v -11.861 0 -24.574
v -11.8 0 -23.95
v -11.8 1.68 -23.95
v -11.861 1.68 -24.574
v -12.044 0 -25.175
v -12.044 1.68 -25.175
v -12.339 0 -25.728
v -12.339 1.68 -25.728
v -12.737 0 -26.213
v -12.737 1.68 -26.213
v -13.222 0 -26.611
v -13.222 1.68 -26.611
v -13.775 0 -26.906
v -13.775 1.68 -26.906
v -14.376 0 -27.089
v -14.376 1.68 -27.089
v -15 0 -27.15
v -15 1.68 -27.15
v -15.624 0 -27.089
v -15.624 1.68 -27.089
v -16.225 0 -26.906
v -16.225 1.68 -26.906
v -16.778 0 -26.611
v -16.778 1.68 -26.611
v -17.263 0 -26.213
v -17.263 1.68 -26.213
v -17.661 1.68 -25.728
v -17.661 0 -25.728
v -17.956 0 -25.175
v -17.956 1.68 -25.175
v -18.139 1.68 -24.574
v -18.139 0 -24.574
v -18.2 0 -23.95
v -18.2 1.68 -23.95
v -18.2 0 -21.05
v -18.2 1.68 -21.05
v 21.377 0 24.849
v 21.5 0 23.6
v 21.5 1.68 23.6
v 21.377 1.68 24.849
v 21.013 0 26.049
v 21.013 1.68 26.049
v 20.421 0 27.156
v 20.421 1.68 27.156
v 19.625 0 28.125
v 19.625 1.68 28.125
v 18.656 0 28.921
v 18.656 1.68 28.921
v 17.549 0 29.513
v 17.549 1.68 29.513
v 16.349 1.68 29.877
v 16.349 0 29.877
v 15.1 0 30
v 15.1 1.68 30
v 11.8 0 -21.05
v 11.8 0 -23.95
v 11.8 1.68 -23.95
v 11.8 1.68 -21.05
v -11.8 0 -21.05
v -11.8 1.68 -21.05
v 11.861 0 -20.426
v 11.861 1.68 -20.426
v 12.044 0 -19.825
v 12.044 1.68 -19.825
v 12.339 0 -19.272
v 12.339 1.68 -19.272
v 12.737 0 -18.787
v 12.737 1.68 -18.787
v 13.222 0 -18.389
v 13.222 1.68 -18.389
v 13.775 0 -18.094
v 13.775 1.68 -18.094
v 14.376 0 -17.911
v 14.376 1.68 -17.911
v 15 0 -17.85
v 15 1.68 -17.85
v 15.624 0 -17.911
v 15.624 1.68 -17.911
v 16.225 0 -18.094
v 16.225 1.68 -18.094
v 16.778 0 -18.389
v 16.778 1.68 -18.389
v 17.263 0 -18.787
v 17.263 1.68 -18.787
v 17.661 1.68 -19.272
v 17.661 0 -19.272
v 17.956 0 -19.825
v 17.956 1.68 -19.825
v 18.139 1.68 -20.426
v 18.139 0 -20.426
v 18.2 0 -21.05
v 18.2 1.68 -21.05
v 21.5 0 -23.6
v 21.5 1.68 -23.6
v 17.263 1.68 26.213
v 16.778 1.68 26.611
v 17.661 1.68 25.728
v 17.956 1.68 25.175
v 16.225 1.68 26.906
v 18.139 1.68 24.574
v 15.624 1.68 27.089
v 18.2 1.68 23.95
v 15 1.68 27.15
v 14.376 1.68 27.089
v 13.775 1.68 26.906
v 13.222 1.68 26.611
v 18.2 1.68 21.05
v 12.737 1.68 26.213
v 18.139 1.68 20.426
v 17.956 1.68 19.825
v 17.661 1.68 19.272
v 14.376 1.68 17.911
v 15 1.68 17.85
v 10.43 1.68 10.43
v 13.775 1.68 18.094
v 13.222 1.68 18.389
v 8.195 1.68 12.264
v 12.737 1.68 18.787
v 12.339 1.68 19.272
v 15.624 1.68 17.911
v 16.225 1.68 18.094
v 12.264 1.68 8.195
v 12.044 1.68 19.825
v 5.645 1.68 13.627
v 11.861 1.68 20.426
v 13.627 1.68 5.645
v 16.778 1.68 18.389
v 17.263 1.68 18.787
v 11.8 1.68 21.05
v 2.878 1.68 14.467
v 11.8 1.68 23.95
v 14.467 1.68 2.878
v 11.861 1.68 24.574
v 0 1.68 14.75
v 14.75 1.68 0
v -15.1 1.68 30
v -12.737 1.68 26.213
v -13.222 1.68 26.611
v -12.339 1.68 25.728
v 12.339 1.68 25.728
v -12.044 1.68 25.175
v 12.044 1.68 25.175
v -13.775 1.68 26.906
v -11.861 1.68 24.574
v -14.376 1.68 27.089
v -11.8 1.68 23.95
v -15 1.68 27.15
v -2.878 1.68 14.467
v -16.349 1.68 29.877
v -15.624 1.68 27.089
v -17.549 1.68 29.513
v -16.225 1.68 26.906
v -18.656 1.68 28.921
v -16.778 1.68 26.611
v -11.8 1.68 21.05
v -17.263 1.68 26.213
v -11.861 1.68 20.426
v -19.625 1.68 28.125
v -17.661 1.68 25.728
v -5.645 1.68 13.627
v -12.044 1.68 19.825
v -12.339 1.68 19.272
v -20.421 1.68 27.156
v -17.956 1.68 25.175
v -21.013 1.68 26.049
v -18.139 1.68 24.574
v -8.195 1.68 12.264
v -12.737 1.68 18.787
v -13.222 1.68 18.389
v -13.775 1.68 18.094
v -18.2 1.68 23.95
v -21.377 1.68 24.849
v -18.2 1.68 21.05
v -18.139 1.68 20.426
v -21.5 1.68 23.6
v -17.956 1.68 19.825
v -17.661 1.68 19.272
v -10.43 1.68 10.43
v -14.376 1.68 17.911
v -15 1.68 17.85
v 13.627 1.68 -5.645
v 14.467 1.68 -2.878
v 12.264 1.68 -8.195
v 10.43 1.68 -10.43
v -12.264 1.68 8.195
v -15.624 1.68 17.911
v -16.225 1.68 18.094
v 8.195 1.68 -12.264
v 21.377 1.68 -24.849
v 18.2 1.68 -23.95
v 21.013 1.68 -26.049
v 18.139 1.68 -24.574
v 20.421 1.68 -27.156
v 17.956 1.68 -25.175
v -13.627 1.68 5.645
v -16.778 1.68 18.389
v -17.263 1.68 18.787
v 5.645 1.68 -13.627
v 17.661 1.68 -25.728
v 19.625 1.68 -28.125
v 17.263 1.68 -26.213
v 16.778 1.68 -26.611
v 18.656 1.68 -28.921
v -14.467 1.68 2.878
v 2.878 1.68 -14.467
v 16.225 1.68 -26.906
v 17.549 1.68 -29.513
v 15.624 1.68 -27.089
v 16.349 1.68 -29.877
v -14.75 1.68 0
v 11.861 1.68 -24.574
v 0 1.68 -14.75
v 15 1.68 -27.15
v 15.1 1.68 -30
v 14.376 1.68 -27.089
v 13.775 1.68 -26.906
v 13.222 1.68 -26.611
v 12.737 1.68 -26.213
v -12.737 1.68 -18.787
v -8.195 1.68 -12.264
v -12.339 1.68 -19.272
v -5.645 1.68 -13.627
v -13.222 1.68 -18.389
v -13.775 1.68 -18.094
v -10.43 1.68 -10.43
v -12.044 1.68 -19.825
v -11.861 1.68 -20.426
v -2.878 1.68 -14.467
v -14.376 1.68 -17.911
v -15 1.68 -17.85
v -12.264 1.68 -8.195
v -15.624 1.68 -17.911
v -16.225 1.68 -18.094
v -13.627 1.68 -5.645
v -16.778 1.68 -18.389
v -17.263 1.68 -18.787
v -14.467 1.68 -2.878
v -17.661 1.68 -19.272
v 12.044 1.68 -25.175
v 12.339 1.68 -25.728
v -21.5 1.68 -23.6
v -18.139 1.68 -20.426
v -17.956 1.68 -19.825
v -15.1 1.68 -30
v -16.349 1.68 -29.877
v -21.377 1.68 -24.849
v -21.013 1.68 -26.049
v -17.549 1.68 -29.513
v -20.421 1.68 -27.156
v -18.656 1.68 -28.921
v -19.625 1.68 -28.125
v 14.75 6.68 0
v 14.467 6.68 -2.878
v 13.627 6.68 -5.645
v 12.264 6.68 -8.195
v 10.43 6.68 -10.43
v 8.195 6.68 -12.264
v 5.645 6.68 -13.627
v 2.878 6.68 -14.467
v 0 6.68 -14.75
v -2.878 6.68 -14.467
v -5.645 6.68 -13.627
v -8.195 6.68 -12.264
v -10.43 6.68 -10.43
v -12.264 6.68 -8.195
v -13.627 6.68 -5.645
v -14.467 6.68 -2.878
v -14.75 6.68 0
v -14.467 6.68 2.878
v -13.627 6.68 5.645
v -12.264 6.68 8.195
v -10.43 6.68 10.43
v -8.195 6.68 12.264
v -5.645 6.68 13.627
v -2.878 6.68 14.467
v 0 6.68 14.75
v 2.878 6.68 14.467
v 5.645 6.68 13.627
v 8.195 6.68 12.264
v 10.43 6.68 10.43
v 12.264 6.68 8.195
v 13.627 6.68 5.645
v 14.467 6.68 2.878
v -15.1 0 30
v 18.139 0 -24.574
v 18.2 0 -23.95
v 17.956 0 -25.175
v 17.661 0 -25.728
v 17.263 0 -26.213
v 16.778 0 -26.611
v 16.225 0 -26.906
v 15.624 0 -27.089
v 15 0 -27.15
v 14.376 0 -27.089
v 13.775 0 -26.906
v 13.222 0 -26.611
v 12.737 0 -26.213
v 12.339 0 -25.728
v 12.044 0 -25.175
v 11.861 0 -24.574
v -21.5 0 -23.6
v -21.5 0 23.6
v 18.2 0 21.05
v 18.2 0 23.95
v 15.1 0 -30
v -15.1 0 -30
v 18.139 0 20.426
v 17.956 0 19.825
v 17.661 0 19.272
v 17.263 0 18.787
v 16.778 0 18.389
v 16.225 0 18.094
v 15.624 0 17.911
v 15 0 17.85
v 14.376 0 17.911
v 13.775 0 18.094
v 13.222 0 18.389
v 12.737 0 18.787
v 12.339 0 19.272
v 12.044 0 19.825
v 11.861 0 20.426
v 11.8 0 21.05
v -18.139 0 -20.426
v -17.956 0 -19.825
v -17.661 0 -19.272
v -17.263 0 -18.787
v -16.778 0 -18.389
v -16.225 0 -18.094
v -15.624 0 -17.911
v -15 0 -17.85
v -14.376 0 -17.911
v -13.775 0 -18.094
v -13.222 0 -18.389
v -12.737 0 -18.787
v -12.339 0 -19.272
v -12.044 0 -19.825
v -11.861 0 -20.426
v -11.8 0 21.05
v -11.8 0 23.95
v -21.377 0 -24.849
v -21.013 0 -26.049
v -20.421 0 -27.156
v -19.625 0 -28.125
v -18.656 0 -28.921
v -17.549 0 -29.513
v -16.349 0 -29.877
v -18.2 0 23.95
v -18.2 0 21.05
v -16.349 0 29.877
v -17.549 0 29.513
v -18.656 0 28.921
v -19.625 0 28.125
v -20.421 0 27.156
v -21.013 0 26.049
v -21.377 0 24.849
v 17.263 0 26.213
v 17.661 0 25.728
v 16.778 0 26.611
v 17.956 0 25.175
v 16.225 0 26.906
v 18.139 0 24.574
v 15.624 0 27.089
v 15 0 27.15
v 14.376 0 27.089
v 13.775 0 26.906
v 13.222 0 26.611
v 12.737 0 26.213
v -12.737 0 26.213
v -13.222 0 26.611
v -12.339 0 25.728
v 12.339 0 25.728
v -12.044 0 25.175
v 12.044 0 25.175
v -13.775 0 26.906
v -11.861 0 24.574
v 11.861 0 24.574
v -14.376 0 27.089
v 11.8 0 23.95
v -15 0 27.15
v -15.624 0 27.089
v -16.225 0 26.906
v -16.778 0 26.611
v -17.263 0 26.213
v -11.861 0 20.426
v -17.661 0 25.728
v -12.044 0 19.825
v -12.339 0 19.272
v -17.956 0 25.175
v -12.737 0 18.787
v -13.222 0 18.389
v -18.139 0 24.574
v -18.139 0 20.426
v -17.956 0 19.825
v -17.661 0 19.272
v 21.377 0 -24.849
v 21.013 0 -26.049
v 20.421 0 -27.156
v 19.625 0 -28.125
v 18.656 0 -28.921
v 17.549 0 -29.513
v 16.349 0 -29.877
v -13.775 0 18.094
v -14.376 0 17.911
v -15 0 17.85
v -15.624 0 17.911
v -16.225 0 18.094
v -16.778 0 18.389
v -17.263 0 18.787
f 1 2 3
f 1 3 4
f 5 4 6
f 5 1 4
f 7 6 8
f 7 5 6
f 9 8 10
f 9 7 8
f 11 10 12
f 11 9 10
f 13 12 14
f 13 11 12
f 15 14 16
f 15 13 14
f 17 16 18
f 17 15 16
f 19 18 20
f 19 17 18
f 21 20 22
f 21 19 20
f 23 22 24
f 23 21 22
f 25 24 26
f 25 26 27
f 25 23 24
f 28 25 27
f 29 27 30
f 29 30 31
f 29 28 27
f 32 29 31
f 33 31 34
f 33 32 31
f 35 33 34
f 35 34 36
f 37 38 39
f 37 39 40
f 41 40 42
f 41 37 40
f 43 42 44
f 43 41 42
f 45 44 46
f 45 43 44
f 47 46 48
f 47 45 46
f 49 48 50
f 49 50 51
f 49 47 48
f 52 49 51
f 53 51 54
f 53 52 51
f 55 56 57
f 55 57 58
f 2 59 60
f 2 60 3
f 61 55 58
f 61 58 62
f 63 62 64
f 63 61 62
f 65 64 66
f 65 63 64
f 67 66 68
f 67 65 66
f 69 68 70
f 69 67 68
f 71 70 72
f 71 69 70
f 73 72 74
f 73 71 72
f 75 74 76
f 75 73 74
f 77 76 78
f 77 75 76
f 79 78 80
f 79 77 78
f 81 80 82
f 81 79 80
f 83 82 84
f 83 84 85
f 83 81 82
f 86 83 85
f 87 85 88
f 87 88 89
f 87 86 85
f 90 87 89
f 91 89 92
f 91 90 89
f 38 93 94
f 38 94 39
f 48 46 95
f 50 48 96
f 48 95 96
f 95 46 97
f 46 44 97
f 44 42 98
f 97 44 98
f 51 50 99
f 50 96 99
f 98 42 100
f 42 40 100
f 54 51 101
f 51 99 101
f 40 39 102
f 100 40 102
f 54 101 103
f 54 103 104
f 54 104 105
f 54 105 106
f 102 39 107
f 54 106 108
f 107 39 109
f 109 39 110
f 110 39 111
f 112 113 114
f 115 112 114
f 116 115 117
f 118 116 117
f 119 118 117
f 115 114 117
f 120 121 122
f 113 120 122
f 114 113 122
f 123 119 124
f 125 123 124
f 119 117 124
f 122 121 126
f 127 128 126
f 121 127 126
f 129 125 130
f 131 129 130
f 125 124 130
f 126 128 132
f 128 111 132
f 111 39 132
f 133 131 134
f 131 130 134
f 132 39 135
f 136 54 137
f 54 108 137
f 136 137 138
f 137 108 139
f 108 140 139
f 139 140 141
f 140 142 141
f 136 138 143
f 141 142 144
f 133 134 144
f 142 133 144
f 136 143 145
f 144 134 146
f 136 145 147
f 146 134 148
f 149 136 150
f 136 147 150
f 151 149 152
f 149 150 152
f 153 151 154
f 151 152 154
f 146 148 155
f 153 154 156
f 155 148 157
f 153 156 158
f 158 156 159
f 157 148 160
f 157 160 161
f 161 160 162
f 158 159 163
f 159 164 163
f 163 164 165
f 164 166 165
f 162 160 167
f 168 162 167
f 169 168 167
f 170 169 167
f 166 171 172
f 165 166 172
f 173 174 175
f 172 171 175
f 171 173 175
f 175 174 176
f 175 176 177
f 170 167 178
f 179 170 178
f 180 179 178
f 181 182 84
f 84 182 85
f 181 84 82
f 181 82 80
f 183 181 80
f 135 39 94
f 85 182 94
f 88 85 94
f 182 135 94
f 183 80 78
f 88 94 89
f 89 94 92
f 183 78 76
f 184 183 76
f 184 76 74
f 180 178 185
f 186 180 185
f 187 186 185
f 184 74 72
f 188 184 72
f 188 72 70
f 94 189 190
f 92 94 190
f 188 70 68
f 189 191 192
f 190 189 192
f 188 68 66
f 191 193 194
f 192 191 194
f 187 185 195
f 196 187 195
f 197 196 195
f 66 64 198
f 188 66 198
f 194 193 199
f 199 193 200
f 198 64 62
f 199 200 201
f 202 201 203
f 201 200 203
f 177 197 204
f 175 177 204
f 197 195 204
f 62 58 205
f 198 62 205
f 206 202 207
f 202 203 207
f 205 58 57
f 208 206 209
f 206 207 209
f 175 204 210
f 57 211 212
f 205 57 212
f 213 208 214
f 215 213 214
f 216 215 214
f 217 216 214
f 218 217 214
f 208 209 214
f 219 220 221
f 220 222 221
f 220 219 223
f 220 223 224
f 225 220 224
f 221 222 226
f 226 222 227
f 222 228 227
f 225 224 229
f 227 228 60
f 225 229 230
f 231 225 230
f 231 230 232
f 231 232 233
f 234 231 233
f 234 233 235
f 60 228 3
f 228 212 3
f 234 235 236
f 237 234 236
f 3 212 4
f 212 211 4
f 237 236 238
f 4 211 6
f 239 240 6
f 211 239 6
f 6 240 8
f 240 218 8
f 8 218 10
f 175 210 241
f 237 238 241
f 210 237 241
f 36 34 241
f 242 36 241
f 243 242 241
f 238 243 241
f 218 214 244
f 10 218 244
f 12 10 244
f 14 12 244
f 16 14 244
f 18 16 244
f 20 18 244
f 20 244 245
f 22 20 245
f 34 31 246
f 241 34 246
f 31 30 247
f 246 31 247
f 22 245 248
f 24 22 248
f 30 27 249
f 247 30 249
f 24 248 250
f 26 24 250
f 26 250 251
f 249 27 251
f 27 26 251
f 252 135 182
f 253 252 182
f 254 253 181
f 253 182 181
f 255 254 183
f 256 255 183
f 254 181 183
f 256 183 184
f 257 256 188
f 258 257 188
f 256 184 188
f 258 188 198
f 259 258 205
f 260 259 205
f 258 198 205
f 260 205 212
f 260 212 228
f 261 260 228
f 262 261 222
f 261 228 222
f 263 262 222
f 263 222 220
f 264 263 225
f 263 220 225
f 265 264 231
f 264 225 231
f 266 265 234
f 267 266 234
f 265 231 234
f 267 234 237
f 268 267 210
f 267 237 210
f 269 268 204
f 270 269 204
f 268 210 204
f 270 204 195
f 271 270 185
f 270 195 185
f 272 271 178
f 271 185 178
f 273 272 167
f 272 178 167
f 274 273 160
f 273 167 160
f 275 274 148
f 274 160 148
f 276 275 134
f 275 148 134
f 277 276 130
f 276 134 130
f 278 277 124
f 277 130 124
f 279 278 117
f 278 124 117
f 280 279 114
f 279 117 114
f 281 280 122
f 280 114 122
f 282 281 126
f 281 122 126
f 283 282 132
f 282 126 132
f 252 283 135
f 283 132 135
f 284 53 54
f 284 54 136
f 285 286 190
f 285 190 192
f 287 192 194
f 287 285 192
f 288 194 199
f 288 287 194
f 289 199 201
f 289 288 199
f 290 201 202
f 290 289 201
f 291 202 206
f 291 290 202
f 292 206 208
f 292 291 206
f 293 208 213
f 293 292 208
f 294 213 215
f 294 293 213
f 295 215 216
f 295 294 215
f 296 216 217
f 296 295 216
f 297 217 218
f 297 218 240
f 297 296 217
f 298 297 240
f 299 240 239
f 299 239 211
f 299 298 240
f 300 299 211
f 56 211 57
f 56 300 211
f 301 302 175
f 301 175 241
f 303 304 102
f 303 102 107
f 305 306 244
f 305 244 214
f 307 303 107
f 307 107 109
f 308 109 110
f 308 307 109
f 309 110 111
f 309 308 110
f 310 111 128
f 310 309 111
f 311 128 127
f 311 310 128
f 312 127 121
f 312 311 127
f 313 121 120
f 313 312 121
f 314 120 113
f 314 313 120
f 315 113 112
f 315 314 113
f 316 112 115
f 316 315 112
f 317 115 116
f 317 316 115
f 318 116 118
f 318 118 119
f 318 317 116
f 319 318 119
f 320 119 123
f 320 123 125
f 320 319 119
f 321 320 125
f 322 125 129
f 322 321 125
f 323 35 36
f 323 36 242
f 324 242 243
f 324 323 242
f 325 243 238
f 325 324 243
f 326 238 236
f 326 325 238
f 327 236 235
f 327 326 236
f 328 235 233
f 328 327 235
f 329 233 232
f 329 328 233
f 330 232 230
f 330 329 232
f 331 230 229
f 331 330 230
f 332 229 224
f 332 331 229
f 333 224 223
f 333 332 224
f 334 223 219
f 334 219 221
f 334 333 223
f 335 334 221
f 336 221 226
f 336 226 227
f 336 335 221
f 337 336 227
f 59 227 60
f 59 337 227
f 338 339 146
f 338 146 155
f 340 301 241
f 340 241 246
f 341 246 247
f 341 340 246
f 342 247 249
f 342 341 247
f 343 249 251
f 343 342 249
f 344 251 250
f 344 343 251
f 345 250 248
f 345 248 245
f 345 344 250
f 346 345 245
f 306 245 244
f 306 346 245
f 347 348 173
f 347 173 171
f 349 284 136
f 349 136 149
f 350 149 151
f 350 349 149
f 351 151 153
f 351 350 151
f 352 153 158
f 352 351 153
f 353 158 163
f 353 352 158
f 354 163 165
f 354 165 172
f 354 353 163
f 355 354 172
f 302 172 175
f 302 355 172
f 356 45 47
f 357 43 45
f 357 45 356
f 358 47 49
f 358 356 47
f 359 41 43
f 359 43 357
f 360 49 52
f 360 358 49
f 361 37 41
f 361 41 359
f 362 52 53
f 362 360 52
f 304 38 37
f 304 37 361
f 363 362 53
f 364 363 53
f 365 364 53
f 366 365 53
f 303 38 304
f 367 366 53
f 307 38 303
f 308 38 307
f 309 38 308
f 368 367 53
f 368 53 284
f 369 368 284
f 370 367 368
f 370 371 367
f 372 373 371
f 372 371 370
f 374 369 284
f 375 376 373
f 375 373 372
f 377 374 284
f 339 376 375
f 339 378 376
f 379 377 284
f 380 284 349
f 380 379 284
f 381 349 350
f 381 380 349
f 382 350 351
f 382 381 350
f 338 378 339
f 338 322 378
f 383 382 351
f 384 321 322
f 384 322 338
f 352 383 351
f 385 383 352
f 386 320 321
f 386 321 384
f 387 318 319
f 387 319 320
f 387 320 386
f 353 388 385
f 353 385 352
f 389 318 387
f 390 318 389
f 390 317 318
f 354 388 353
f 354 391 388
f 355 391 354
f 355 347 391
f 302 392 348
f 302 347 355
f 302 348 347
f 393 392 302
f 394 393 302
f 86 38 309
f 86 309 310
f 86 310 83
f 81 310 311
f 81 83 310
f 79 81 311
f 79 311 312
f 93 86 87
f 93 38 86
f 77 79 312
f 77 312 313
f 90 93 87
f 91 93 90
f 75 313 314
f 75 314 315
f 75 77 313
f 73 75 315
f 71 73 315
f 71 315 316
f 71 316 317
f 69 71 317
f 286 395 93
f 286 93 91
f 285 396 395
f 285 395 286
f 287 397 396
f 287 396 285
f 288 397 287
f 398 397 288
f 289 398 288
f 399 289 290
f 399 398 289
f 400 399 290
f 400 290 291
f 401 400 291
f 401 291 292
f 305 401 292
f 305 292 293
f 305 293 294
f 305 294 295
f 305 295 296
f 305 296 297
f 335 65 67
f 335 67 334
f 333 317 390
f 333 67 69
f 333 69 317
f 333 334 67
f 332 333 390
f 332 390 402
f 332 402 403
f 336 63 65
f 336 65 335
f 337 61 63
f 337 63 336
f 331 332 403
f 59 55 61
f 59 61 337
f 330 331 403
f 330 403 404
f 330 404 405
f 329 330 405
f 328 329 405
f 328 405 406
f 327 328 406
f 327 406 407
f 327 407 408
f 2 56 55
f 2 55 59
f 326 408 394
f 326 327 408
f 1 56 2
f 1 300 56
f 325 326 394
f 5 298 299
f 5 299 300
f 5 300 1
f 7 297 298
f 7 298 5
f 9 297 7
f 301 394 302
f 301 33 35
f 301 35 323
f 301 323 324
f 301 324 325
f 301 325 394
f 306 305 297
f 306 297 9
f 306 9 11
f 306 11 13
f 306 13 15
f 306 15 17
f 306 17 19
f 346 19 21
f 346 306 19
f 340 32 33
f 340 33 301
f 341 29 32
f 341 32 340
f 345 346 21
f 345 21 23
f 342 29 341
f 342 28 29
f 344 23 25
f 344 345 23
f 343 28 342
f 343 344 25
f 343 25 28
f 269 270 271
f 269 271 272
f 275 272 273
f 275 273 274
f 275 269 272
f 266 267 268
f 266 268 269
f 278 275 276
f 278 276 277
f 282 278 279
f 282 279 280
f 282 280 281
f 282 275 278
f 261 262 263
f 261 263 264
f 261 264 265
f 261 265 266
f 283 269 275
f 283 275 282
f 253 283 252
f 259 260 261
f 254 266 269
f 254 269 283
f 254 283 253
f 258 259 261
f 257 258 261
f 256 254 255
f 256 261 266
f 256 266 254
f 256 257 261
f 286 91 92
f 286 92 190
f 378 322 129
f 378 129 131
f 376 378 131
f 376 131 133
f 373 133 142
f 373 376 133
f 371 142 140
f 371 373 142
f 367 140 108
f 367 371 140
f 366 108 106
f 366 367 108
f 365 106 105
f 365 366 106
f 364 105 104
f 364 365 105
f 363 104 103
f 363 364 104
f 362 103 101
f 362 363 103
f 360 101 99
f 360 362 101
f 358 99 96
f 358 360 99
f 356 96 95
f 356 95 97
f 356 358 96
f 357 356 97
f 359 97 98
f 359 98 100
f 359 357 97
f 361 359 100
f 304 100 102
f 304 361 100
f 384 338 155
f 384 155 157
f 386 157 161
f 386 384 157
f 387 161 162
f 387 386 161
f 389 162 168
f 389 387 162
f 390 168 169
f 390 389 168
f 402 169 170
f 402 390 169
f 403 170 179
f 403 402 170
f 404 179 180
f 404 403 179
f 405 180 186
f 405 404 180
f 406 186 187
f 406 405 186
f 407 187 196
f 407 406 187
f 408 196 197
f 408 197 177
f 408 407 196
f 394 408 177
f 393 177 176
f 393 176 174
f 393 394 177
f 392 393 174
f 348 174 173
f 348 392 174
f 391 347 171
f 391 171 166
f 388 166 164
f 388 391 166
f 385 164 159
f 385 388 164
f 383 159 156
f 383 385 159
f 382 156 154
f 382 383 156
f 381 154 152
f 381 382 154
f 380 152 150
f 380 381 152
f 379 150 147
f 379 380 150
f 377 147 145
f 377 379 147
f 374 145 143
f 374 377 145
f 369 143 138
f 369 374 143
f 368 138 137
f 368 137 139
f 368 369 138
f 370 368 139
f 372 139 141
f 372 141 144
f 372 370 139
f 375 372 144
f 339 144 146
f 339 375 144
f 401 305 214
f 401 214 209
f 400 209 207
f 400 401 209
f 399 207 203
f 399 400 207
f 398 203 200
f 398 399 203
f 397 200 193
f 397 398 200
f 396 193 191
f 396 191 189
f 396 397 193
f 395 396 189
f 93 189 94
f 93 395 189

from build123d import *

# Parameters (mm, degrees)
EXTRUDE_1_DEPTH = 1.68
SKETCH_2_R      = 14.75
EXTRUDE_3_DEPTH = 5


with BuildPart() as part:
    # 草图1 → 凸台-拉伸1 (new body)
    with BuildSketch(Plane(origin=(0, 0, 0), x_dir=(1, 0, 0), z_dir=(0, 1, 0))):
        with BuildLine():
            ThreePointArc((-21.5, 23.6), (-19.6254834, 28.1254834), (-15.1, 30))
            Line((-15.1, 30), (15.1, 30))
            ThreePointArc((15.1, 30), (19.6254834, 28.1254834), (21.5, 23.6))
            Line((21.5, 23.6), (21.5, -23.6))
            ThreePointArc((21.5, -23.6), (19.6254834, -28.1254834), (15.1, -30))
            Line((15.1, -30), (-15.1, -30))
            ThreePointArc((-15.1, -30), (-19.6254834, -28.1254834), (-21.5, -23.6))
            Line((-21.5, -23.6), (-21.5, 23.6))
        make_face()
        with BuildLine():
            ThreePointArc((-18.2, -23.95), (-15, -27.15), (-11.8, -23.95))
            Line((-11.8, -23.95), (-11.8, -21.05))
            ThreePointArc((-11.8, -21.05), (-15, -17.85), (-18.2, -21.05))
            Line((-18.2, -21.05), (-18.2, -23.95))
        make_face(mode=Mode.SUBTRACT)
        with BuildLine():
            ThreePointArc((18.2, -21.05), (15, -17.85), (11.8, -21.05))
            Line((11.8, -21.05), (11.8, -23.95))
            ThreePointArc((11.8, -23.95), (15, -27.15), (18.2, -23.95))
            Line((18.2, -23.95), (18.2, -21.05))
        make_face(mode=Mode.SUBTRACT)
        with BuildLine():
            ThreePointArc((18.2, 23.95), (15, 27.15), (11.8, 23.95))
            Line((11.8, 23.95), (11.8, 21.05))
            ThreePointArc((11.8, 21.05), (15, 17.85), (18.2, 21.05))
            Line((18.2, 21.05), (18.2, 23.95))
        make_face(mode=Mode.SUBTRACT)
        with BuildLine():
            ThreePointArc((-18.2, 21.05), (-15, 17.85), (-11.8, 21.05))
            Line((-11.8, 21.05), (-11.8, 23.95))
            ThreePointArc((-11.8, 23.95), (-15, 27.15), (-18.2, 23.95))
            Line((-18.2, 23.95), (-18.2, 21.05))
        make_face(mode=Mode.SUBTRACT)
    extrude(amount=EXTRUDE_1_DEPTH)

    # 草图2 → 凸台-拉伸3 (add)
    with BuildSketch(Plane(origin=(0, 1.68, 0), x_dir=(1, 0, 0), z_dir=(0, 1, 0))):
        Circle(SKETCH_2_R)
    extrude(amount=EXTRUDE_3_DEPTH)


solid = part.part
